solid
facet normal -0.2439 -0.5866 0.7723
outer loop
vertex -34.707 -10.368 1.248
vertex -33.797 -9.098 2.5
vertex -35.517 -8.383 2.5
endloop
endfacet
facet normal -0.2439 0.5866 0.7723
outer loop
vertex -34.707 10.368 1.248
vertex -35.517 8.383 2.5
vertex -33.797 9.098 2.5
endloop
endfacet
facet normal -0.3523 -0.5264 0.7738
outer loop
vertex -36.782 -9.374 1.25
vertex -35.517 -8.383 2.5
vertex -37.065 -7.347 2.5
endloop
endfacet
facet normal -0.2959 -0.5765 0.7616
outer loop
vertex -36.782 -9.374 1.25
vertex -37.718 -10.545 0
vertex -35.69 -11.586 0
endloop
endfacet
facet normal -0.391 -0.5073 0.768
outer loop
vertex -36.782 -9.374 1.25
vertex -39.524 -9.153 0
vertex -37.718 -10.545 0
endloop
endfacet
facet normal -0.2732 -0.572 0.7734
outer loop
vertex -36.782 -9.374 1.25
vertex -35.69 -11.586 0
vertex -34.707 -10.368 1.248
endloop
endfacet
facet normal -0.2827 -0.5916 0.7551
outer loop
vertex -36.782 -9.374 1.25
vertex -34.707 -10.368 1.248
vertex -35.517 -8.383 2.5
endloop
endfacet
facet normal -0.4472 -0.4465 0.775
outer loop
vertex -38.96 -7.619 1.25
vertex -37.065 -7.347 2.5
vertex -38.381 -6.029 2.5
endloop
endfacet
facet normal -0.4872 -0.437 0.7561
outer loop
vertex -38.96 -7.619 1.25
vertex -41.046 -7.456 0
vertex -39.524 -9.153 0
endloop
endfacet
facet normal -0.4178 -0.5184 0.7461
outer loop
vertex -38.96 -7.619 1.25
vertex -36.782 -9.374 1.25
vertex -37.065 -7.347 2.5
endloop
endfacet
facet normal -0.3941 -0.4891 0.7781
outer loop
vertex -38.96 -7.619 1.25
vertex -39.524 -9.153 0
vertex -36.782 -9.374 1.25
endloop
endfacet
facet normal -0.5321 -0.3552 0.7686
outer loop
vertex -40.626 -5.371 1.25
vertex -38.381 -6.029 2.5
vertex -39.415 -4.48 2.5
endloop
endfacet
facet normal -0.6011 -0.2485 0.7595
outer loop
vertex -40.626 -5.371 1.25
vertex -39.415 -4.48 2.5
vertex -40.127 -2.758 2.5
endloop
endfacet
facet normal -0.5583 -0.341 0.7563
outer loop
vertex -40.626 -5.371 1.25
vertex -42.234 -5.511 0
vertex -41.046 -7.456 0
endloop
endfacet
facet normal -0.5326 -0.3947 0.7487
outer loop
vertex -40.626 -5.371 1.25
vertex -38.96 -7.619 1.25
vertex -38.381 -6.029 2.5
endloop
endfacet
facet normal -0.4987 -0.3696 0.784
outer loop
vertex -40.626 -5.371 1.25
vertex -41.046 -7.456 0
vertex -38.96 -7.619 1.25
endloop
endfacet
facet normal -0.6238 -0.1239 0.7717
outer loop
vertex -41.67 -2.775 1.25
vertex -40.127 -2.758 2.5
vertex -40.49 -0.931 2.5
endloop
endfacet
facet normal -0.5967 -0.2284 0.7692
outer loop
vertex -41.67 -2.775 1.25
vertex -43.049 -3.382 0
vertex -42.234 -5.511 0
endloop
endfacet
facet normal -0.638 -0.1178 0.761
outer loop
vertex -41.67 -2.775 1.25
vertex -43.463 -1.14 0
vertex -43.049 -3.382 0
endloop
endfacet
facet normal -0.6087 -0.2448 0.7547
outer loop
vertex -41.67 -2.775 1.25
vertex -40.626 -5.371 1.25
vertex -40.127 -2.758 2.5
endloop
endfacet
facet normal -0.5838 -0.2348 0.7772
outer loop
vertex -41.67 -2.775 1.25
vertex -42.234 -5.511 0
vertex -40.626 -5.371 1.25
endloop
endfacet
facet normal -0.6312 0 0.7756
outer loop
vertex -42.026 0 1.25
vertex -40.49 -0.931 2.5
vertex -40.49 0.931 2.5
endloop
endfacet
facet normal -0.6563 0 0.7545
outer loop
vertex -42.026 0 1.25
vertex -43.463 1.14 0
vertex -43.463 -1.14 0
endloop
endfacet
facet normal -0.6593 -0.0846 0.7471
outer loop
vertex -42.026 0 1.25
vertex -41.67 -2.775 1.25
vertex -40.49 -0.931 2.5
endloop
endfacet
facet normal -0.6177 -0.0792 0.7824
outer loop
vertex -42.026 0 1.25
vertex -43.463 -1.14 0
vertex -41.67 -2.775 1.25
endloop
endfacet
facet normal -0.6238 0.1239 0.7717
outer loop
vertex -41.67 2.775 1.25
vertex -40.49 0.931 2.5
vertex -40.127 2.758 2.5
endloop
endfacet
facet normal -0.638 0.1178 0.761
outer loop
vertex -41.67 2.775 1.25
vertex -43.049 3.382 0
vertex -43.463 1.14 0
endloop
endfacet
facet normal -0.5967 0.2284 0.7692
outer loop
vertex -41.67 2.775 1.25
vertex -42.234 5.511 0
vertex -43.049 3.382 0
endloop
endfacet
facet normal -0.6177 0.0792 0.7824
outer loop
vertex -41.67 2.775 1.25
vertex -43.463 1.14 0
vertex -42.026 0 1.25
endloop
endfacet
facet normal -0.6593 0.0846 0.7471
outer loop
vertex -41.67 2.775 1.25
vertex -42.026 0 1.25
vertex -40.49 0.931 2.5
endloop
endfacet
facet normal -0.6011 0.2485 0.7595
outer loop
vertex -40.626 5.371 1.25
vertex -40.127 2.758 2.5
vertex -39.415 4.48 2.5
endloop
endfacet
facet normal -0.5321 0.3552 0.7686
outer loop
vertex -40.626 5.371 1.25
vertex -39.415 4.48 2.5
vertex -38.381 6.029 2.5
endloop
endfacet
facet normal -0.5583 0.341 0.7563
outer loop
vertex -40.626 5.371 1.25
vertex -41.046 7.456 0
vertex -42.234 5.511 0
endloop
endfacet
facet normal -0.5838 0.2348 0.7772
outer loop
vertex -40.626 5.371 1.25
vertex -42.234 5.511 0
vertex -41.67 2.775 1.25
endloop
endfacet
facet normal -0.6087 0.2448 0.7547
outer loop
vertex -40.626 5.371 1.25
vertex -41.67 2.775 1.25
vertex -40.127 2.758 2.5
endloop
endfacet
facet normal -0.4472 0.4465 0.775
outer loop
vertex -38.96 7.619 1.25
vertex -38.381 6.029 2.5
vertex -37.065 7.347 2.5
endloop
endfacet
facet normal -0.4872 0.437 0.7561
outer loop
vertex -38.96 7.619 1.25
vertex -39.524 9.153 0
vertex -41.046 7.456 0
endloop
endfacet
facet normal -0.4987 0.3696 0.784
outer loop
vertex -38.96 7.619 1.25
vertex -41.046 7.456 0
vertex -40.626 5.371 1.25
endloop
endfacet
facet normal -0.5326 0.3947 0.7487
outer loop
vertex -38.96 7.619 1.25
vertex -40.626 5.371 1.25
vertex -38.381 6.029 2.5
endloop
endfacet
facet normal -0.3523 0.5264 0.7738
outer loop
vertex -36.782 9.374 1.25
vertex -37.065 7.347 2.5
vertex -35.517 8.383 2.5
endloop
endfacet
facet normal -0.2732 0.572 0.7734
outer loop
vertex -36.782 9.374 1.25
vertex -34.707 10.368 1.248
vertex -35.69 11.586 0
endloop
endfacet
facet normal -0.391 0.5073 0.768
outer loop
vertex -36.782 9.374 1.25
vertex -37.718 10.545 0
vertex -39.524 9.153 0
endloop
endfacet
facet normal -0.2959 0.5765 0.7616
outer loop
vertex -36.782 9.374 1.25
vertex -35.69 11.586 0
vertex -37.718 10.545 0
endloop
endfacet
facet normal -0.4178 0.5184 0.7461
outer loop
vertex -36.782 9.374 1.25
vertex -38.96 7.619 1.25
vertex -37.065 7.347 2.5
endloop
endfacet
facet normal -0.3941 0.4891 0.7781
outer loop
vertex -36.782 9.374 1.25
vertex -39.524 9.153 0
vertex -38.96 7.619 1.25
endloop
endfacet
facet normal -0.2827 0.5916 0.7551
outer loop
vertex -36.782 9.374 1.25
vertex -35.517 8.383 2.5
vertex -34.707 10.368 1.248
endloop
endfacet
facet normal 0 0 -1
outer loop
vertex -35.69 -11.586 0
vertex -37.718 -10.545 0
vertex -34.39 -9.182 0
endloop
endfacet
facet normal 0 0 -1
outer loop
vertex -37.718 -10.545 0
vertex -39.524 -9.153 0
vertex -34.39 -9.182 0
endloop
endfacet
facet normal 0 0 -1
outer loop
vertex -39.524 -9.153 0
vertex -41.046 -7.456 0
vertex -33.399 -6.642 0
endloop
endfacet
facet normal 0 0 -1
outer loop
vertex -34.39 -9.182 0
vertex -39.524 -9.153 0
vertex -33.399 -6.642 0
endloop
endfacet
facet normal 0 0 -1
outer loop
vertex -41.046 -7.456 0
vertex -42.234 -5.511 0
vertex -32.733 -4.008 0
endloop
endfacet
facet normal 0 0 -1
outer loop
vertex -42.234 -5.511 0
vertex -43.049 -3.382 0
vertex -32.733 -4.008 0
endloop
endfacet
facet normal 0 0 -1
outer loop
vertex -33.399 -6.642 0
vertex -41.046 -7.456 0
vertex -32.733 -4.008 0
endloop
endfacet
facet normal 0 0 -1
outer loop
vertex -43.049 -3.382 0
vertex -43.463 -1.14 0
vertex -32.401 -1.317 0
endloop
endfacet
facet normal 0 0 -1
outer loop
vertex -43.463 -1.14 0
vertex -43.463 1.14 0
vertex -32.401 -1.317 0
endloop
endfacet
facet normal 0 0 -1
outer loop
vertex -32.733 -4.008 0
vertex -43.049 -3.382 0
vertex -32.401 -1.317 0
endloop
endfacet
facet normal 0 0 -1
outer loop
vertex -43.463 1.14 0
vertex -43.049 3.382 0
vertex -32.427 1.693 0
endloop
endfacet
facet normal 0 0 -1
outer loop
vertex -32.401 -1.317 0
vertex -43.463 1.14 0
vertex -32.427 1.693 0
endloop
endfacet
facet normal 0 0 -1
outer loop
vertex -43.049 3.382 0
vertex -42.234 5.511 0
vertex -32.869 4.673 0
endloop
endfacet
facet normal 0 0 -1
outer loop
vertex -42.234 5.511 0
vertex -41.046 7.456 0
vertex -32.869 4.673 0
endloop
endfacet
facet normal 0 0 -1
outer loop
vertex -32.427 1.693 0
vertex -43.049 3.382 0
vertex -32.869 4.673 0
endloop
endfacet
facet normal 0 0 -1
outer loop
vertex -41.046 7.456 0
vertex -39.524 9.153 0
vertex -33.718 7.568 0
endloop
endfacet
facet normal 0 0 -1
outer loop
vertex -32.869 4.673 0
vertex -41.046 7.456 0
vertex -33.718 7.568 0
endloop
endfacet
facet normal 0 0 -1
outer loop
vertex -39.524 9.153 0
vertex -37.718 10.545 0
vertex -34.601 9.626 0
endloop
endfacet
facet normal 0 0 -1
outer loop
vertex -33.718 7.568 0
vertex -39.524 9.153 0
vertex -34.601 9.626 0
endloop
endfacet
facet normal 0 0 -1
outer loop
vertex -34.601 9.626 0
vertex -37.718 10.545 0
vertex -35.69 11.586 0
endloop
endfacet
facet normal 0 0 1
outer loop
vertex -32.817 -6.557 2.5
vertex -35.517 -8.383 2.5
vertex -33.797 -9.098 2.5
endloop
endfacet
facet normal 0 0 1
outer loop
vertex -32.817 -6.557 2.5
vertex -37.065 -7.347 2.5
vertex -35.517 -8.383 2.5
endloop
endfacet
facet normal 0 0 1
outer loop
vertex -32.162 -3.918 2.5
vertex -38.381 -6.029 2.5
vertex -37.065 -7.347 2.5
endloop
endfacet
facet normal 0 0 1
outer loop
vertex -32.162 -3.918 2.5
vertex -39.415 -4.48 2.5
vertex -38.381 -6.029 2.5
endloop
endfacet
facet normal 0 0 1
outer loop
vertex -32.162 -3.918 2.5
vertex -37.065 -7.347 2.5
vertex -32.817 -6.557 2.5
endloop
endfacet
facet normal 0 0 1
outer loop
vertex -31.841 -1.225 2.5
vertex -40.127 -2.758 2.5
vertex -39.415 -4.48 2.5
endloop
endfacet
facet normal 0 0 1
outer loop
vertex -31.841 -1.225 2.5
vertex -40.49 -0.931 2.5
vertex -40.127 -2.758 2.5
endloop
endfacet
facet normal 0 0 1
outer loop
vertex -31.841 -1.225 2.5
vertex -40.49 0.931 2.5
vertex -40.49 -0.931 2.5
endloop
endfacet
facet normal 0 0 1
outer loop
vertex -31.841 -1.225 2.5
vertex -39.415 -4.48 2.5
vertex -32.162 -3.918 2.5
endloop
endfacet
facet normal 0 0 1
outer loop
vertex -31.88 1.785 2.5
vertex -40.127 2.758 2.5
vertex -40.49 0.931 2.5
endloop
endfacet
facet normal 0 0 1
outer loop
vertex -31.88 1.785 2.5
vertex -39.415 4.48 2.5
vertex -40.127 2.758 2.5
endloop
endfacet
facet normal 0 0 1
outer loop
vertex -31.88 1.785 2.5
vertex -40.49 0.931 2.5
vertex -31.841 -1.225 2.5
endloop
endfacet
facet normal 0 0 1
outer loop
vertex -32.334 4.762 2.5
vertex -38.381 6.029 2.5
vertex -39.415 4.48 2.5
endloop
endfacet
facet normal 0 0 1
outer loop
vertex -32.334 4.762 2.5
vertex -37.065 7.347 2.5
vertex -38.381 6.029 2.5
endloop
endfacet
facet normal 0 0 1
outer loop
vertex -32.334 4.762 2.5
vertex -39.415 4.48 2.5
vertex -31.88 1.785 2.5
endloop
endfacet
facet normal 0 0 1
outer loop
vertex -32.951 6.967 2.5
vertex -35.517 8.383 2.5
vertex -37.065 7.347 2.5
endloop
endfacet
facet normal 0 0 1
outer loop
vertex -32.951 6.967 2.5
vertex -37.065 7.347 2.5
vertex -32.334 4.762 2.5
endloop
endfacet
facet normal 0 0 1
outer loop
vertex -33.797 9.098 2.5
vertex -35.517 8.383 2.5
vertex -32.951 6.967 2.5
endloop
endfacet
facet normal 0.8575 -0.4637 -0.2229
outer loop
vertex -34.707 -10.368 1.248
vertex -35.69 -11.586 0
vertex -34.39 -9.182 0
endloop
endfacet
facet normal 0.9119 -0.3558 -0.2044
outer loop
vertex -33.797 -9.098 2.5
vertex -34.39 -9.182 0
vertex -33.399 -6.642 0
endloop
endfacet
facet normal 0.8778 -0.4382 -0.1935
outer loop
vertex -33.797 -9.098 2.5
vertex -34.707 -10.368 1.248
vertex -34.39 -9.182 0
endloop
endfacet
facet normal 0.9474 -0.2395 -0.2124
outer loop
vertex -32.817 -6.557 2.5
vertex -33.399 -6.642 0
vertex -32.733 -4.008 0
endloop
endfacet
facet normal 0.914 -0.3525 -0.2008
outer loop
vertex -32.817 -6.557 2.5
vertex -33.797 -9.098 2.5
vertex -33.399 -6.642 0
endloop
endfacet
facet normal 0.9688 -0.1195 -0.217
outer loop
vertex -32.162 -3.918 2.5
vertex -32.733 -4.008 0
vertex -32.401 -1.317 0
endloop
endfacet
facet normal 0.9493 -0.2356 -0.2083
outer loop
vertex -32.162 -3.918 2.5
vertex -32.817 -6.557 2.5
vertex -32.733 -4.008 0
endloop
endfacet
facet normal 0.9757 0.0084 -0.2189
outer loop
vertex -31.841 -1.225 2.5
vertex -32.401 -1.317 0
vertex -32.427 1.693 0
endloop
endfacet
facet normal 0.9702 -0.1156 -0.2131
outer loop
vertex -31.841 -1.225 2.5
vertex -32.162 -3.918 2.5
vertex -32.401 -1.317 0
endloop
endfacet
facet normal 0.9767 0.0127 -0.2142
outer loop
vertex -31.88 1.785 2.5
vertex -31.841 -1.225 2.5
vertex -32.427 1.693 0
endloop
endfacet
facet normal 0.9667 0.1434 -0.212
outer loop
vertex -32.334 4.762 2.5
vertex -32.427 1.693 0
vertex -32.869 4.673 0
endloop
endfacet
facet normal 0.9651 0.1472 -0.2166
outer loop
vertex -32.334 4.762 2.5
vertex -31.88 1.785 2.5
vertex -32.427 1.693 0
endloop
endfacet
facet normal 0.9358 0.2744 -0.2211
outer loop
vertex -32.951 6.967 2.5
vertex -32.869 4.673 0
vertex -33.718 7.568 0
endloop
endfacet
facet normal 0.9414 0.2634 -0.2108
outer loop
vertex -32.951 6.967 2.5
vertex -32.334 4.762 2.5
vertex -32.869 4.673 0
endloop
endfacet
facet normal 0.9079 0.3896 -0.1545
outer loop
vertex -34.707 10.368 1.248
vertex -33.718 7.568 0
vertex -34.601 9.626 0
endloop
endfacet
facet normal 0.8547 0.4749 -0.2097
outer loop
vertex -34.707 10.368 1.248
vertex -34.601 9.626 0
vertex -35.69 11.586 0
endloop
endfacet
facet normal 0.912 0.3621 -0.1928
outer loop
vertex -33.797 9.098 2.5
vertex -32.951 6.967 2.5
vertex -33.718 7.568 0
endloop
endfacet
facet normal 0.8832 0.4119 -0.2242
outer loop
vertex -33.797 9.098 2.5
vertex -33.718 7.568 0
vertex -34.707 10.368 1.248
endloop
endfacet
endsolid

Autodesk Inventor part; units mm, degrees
ref_plane "YZ Plane" through (0, 0, 0) normal (1, 0, 0) x (0, 1, 0)
sketch "Sketch1" plane through (0, 0, 0) normal (0, 0, 1) x (1, 0, 0)
  spline S0 degree 3 poles (12.775809, 13.743738) (13.453575, 14.296004) (14.16507, 14.792978) (16.937316, 16.441783) (19.224317, 17.243595) (24.595739, 17.979132) (27.723679, 17.596307) (32.869411, 15.535143) (34.964738, 14.129672) (38.628289, 10.359381) (40.089591, 7.896643) (41.435431, 3.545039) (41.703305, 1.772836) (41.703303, -0.000028) (41.7033, -1.772892) (41.435423, -3.545074) (40.089464, -7.897041) (38.627791, -10.360188) (34.965482, -14.128645) (32.872746, -15.532844) (27.722529, -17.597958) (24.586064, -17.980815) (19.219795, -17.240648) (16.945007, -16.443301) (14.175916, -14.800553) (13.458713, -14.300191) (12.775809, -13.743738) knots 0.0475769 0.0475769 0.0475769 0.0475769 0.30841807 0.30841807 1.01543689 1.01543689 1.92782472 1.92782472 2.66674079 2.66674079 3.49744633 3.49744633 4.02653047 4.02653047 4.02653047 4.55561461 4.55561461 5.38644202 5.38644202 6.12460097 6.12460097 7.03935565 7.03935565 7.74266001 7.74266001 8.00547976 8.00547976 8.00547976 8.00547976 weights 1 1 1 1 1 1 1 1 1 1 1 1 1 1 1 1 1 1 1 1 1 1 1 1 1 1 1
  spline S1 degree 3 poles (12.775809, -13.743738) (12.326511, -13.377635) (11.821873, -13.079408) (10.656846, -12.620046) (9.984673, -12.49013) (9.311785, -12.49013) knots 0 0 0 0 0.46270736 0.46270736 1 1 1 1 weights 1 1 1 1 1 1
  line L0 (9.311785, -12.49013) -> (-31.025337, -12.49013)
  spline S2 degree 3 poles (-31.025337, -12.49013) (-32.110865, -12.49013) (-33.198033, -12.347386) (-34.736089, -11.936981) (-35.218379, -11.77627) (-35.690276, -11.586272) knots 0 0 0 0 0.68100487 0.68100487 1 1 1 1 weights 1 1 1 1 1 1
  spline S3 degree 3 poles (9.311785, 12.49013) (9.7991, 12.49013) (10.286231, 12.55778) (11.492025, 12.895964) (12.182584, 13.260359) (12.775809, 13.743738) knots 0 0 0 0 0.38911359 0.38911359 1 1 1 1 weights 1 1 1 1 1 1
  line L1 (0, 0) -> (-42.287334, 0) construction
  line L2 (9.311785, 12.49013) -> (-31.025337, 12.49013)
  arc A0 (-31.025337, 12.49013) -> (-31.025337, -12.49013) centre (-31.025337, 0) ccw
sketch "Sketch1 outline for Extrusion1" plane through (0, 0, 0) normal (0, 0, 1) x (1, 0, 0)
  spline S0 degree 3 poles (12.775809, 13.743738) (13.453575, 14.296004) (14.16507, 14.792978) (16.937316, 16.441783) (19.224317, 17.243595) (24.595739, 17.979132) (27.723679, 17.596307) (32.869411, 15.535143) (34.964738, 14.129672) (38.628289, 10.359381) (40.089591, 7.896643) (41.435431, 3.545039) (41.703305, 1.772836) (41.703303, -0.000028) (41.7033, -1.772892) (41.435423, -3.545074) (40.089464, -7.897041) (38.627791, -10.360188) (34.965482, -14.128645) (32.872746, -15.532844) (27.722529, -17.597958) (24.586064, -17.980815) (19.219795, -17.240648) (16.945007, -16.443301) (14.175916, -14.800553) (13.458713, -14.300191) (12.775809, -13.743738) knots 0 0 0 0 0.03277763 0.03277763 0.12162249 0.12162249 0.23627429 0.23627429 0.3291274 0.3291274 0.4335149 0.4335149 0.50000027 0.50000027 0.50000027 0.56648564 0.56648564 0.67088845 0.67088845 0.76364643 0.76364643 0.87859564 0.87859564 0.96697374 0.96697374 1 1 1 1
  spline S1 degree 3 poles (12.775809, -13.743738) (12.326511, -13.377635) (11.821873, -13.079408) (10.656846, -12.620046) (9.984673, -12.49013) (9.311785, -12.49013) knots 0 0 0 0 0.46270736 0.46270736 1 1 1 1
  line L0 (9.311785, -12.49013) -> (-31.025337, -12.49013)
  arc A0 (-31.025337, -12.49013) -> (-31.025337, 12.49013) centre (-31.025337, 0) cw
  line L1 (-31.025337, 12.49013) -> (9.311785, 12.49013)
  spline S2 degree 3 poles (9.311785, 12.49013) (9.7991, 12.49013) (10.286231, 12.55778) (11.492025, 12.895964) (12.182584, 13.260359) (12.775809, 13.743738) knots 0 0 0 0 0.38911359 0.38911359 1 1 1 1
extrude "Extrusion1" add sketch "Sketch1 outline for Extrusion1" along normal blind 2.5
sketch "Sketch6" plane through (0, 0, 2.5) normal (0, 0, 1) x (1, 0, 0)
  line L0 (-9.525285, -2.542488) -> (-15.356425, -2.542488) construction
  line L1 (-15.356425, -2.542488) -> (-15.356425, 2.542488) construction
  line L2 (-15.356425, 2.542488) -> (-9.525285, 2.542488) construction
  line L3 (-9.525285, 2.542488) -> (-9.525285, -2.542488) construction
  point P0 (0, 0)
  point P1 (-6.22634, 0)
decal "Decal1"
ref_plane "Work Plane1" through (0, 0, 0) normal (0.2164396, 0, 0.976296) x (0, 1, 0)
sketch "Sketch7" plane through (0, 0, 0) normal (0.2164396, 0, 0.976296) x (0, 1, 0)
  point P0 (0, 0)
ref_plane "Work Plane2" through (0, 0, 0) normal (0.2164396, 0, 0.976296) x (0, 1, 0)
sketch "Sketch8" plane through (0, 0, 0) normal (0.2164396, 0, 0.976296) x (0, 1, 0)
  spline S0 degree 3 poles (-12.778059, 35.623375) (-13.1078, 34.920563) (-13.375951, 34.191997) (-13.894146, 32.296016) (-14.054771, 31.101656) (-14.054771, 29.909099) knots -12.94996087 -12.94996087 -12.94996087 -12.94996087 -12.73961425 -12.73961425 -12.41484583 -12.41484583 -12.41484583 -12.41484583 weights 1 1 1 1 1 1
  arc A0 (-15.649435, 38.017312) -> (14.955462, 37.360965) centre (0, 53.868836) ccw
  point P0 (0, 0)
  dimension "d51" = 22.275
surface extrude "ExtrusionSrf1" sketch "Sketch8" against normal blind 38.75 shown no curves A0
split body "Split1" result one side removed by surface "ExtrusionSrf1" removed pieces at (-4.595575, -0.488214, 0.5)
draft "FaceDraft1" angle 50 pull direction (0, 0, 1) faces at (-36.333978, 11.305825, 1.666667) fixed edges at (-43.515467, 0, 0)
properties part number "gornji shiny dio"
